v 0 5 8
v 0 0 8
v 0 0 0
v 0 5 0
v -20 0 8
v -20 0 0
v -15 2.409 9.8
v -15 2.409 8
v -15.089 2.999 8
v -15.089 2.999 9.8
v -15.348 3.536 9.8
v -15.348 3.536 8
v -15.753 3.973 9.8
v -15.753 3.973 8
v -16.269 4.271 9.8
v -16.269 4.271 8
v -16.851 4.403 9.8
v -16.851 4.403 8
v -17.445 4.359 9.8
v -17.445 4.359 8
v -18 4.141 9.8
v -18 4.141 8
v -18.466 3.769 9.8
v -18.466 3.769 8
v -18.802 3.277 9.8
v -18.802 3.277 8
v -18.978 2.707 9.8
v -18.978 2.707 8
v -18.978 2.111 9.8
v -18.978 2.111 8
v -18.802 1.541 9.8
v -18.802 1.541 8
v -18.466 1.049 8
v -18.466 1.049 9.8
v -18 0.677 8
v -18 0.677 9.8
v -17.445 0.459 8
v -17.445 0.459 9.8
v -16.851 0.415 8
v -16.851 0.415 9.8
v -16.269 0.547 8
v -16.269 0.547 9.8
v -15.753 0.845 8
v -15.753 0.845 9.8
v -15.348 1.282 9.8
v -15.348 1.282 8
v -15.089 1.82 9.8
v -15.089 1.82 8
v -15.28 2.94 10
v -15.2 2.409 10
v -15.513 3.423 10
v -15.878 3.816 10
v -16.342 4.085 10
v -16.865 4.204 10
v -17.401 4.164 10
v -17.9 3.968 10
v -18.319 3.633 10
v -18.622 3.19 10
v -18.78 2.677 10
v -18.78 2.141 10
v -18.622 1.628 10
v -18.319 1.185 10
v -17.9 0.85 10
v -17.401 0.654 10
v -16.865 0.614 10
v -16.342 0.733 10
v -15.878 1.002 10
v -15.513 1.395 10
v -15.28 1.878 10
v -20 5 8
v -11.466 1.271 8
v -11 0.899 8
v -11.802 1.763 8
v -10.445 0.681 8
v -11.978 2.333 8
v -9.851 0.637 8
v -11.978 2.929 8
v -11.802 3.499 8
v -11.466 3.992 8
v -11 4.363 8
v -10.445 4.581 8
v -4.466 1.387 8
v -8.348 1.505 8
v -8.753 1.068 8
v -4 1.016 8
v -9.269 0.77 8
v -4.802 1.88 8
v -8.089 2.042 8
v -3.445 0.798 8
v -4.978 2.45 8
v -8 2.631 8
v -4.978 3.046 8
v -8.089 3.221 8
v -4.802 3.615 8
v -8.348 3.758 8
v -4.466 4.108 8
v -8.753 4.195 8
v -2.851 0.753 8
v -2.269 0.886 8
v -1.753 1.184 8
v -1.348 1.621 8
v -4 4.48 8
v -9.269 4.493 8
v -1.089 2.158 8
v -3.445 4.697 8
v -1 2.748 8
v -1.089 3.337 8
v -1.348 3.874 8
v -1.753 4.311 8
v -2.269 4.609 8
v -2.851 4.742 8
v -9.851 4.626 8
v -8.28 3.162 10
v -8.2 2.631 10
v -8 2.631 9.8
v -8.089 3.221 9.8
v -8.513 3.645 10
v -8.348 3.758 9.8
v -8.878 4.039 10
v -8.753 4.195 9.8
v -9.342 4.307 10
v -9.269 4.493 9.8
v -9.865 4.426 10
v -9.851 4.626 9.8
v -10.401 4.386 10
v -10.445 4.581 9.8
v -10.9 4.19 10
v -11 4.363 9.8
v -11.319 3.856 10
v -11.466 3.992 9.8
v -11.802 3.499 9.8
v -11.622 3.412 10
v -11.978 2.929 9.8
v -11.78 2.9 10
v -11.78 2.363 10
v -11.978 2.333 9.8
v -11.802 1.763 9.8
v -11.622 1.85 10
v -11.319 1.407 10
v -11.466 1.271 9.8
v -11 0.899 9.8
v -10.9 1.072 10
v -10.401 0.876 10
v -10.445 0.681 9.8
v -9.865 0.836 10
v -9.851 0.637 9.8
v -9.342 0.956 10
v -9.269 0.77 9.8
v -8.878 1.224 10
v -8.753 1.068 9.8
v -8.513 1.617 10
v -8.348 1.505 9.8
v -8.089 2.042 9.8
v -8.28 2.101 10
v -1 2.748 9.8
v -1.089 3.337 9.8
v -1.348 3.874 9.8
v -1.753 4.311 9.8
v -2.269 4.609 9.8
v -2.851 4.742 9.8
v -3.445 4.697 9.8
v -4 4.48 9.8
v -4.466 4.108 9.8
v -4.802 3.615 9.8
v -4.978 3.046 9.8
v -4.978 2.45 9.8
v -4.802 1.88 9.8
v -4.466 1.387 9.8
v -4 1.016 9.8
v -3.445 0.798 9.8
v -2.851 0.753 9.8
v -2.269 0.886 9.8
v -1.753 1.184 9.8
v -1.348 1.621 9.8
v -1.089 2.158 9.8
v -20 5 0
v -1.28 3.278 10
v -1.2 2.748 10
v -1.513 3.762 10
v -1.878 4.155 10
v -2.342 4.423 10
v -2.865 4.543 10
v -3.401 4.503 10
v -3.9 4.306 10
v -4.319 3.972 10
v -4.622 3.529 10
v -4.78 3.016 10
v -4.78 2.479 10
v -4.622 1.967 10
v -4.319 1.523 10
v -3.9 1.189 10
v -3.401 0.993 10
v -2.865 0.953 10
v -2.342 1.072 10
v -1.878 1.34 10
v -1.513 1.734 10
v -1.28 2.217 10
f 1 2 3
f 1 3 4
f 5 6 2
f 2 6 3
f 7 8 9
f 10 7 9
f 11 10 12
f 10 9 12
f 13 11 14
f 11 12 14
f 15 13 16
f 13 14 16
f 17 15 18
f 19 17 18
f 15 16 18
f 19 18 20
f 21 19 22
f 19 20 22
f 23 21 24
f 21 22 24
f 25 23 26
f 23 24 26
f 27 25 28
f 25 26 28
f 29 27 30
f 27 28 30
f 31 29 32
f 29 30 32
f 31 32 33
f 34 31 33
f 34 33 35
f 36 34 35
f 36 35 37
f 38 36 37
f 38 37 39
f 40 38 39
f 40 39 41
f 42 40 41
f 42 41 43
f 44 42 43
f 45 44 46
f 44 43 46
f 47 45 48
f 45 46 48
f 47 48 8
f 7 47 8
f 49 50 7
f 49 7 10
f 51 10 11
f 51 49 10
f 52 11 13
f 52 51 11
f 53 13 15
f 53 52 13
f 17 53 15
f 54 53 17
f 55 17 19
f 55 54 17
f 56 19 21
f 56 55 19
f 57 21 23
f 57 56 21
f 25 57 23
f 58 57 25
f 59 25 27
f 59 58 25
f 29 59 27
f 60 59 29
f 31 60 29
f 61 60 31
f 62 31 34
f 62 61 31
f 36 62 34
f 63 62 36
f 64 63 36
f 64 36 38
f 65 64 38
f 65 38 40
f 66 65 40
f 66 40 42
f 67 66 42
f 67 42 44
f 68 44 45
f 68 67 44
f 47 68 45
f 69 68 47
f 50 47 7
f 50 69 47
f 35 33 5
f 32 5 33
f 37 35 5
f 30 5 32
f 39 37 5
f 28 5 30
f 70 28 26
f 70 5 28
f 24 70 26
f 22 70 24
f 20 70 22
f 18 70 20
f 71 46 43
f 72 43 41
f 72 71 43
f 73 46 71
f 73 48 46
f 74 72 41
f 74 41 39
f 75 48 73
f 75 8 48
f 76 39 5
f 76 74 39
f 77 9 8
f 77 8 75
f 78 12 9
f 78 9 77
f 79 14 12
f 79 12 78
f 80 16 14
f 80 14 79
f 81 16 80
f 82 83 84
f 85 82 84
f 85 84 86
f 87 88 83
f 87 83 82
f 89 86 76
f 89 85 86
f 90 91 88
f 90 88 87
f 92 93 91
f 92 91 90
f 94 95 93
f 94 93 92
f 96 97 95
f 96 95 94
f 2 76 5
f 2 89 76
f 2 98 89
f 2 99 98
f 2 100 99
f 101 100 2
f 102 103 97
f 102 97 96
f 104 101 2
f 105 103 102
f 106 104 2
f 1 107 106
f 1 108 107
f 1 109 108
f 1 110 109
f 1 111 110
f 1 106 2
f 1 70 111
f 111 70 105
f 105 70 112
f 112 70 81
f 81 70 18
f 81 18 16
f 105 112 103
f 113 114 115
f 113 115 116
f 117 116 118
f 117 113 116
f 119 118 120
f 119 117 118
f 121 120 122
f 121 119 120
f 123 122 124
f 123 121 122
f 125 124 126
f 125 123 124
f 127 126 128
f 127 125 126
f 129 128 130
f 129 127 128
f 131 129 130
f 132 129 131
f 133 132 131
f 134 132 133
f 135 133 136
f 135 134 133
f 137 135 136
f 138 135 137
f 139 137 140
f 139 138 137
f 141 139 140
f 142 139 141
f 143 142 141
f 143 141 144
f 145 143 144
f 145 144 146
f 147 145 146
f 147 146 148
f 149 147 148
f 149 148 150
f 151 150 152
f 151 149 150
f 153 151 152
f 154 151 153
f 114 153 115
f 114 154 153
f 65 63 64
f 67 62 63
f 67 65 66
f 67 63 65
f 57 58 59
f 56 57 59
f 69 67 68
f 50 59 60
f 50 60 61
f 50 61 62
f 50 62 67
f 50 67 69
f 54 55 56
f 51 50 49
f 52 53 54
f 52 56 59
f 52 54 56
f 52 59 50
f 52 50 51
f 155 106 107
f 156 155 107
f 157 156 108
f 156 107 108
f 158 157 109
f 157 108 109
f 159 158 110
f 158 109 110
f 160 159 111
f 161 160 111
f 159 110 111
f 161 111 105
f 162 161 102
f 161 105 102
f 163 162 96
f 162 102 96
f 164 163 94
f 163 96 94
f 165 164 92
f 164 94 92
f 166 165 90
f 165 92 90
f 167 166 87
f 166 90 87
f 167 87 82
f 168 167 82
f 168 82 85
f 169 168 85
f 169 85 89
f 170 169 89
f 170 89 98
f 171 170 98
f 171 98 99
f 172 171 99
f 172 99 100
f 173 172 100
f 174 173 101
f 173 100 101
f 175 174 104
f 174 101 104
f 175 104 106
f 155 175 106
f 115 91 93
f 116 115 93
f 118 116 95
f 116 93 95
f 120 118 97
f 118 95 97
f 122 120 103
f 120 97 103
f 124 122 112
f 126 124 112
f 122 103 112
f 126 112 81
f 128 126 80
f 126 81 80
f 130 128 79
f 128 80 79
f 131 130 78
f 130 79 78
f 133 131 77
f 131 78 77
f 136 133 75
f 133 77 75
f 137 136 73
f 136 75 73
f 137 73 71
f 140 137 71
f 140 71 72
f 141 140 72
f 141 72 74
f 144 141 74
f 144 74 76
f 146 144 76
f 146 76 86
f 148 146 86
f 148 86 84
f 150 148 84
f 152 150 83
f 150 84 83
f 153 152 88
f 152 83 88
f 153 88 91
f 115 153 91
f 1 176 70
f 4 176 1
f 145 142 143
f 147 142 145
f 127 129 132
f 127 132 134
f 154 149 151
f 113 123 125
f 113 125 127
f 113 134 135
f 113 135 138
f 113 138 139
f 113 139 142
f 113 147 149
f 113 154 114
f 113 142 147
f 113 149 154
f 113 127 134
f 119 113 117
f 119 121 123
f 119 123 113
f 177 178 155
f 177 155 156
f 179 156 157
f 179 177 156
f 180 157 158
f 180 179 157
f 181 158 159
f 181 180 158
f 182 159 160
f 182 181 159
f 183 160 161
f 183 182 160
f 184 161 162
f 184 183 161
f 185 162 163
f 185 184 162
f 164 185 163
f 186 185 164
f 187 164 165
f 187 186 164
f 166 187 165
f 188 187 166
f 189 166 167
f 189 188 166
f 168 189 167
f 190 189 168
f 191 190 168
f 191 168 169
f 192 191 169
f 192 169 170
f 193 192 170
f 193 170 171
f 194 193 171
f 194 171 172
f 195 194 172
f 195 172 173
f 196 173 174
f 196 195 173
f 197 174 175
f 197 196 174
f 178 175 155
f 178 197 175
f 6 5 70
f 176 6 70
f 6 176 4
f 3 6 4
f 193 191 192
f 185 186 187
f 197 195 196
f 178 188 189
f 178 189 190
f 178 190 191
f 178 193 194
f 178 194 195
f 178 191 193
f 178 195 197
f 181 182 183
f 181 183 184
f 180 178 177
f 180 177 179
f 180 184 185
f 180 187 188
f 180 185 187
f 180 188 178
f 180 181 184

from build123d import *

# Parameters (mm, degrees)
F0_W     = 20
F0_H     = 5
F1_DEPTH = 8
F2_R     = 2
F3_DEPTH = 2
F4_SIZE  = 0.2


with BuildPart() as f1:
    # F0 (on Top) → F1 (new body)
    with BuildSketch(Plane.XY):
        with Locations((-10, 2.5)):
            Rectangle(F0_W, F0_H)
    extrude(amount=F1_DEPTH)

    # F2 (on face) → F3 (join)
    with BuildSketch(Plane.XY.offset(8)):
        with Locations((-17, 2.409057)):
            Circle(F2_R)
        with Locations((-10, 2.63126)):
            Circle(F2_R)
        with Locations((-3, 2.747634)):
            Circle(F2_R)
    extrude(amount=F3_DEPTH)

    # F4
    f4_edges = [f1.edges().sort_by_distance(p)[0] for p in [
        (-19, 2.409057, 10),
        (-12, 2.63126, 10),
        (-5, 2.747634, 10),
    ]]
    chamfer(f4_edges, length=F4_SIZE)


solid = f1.part
